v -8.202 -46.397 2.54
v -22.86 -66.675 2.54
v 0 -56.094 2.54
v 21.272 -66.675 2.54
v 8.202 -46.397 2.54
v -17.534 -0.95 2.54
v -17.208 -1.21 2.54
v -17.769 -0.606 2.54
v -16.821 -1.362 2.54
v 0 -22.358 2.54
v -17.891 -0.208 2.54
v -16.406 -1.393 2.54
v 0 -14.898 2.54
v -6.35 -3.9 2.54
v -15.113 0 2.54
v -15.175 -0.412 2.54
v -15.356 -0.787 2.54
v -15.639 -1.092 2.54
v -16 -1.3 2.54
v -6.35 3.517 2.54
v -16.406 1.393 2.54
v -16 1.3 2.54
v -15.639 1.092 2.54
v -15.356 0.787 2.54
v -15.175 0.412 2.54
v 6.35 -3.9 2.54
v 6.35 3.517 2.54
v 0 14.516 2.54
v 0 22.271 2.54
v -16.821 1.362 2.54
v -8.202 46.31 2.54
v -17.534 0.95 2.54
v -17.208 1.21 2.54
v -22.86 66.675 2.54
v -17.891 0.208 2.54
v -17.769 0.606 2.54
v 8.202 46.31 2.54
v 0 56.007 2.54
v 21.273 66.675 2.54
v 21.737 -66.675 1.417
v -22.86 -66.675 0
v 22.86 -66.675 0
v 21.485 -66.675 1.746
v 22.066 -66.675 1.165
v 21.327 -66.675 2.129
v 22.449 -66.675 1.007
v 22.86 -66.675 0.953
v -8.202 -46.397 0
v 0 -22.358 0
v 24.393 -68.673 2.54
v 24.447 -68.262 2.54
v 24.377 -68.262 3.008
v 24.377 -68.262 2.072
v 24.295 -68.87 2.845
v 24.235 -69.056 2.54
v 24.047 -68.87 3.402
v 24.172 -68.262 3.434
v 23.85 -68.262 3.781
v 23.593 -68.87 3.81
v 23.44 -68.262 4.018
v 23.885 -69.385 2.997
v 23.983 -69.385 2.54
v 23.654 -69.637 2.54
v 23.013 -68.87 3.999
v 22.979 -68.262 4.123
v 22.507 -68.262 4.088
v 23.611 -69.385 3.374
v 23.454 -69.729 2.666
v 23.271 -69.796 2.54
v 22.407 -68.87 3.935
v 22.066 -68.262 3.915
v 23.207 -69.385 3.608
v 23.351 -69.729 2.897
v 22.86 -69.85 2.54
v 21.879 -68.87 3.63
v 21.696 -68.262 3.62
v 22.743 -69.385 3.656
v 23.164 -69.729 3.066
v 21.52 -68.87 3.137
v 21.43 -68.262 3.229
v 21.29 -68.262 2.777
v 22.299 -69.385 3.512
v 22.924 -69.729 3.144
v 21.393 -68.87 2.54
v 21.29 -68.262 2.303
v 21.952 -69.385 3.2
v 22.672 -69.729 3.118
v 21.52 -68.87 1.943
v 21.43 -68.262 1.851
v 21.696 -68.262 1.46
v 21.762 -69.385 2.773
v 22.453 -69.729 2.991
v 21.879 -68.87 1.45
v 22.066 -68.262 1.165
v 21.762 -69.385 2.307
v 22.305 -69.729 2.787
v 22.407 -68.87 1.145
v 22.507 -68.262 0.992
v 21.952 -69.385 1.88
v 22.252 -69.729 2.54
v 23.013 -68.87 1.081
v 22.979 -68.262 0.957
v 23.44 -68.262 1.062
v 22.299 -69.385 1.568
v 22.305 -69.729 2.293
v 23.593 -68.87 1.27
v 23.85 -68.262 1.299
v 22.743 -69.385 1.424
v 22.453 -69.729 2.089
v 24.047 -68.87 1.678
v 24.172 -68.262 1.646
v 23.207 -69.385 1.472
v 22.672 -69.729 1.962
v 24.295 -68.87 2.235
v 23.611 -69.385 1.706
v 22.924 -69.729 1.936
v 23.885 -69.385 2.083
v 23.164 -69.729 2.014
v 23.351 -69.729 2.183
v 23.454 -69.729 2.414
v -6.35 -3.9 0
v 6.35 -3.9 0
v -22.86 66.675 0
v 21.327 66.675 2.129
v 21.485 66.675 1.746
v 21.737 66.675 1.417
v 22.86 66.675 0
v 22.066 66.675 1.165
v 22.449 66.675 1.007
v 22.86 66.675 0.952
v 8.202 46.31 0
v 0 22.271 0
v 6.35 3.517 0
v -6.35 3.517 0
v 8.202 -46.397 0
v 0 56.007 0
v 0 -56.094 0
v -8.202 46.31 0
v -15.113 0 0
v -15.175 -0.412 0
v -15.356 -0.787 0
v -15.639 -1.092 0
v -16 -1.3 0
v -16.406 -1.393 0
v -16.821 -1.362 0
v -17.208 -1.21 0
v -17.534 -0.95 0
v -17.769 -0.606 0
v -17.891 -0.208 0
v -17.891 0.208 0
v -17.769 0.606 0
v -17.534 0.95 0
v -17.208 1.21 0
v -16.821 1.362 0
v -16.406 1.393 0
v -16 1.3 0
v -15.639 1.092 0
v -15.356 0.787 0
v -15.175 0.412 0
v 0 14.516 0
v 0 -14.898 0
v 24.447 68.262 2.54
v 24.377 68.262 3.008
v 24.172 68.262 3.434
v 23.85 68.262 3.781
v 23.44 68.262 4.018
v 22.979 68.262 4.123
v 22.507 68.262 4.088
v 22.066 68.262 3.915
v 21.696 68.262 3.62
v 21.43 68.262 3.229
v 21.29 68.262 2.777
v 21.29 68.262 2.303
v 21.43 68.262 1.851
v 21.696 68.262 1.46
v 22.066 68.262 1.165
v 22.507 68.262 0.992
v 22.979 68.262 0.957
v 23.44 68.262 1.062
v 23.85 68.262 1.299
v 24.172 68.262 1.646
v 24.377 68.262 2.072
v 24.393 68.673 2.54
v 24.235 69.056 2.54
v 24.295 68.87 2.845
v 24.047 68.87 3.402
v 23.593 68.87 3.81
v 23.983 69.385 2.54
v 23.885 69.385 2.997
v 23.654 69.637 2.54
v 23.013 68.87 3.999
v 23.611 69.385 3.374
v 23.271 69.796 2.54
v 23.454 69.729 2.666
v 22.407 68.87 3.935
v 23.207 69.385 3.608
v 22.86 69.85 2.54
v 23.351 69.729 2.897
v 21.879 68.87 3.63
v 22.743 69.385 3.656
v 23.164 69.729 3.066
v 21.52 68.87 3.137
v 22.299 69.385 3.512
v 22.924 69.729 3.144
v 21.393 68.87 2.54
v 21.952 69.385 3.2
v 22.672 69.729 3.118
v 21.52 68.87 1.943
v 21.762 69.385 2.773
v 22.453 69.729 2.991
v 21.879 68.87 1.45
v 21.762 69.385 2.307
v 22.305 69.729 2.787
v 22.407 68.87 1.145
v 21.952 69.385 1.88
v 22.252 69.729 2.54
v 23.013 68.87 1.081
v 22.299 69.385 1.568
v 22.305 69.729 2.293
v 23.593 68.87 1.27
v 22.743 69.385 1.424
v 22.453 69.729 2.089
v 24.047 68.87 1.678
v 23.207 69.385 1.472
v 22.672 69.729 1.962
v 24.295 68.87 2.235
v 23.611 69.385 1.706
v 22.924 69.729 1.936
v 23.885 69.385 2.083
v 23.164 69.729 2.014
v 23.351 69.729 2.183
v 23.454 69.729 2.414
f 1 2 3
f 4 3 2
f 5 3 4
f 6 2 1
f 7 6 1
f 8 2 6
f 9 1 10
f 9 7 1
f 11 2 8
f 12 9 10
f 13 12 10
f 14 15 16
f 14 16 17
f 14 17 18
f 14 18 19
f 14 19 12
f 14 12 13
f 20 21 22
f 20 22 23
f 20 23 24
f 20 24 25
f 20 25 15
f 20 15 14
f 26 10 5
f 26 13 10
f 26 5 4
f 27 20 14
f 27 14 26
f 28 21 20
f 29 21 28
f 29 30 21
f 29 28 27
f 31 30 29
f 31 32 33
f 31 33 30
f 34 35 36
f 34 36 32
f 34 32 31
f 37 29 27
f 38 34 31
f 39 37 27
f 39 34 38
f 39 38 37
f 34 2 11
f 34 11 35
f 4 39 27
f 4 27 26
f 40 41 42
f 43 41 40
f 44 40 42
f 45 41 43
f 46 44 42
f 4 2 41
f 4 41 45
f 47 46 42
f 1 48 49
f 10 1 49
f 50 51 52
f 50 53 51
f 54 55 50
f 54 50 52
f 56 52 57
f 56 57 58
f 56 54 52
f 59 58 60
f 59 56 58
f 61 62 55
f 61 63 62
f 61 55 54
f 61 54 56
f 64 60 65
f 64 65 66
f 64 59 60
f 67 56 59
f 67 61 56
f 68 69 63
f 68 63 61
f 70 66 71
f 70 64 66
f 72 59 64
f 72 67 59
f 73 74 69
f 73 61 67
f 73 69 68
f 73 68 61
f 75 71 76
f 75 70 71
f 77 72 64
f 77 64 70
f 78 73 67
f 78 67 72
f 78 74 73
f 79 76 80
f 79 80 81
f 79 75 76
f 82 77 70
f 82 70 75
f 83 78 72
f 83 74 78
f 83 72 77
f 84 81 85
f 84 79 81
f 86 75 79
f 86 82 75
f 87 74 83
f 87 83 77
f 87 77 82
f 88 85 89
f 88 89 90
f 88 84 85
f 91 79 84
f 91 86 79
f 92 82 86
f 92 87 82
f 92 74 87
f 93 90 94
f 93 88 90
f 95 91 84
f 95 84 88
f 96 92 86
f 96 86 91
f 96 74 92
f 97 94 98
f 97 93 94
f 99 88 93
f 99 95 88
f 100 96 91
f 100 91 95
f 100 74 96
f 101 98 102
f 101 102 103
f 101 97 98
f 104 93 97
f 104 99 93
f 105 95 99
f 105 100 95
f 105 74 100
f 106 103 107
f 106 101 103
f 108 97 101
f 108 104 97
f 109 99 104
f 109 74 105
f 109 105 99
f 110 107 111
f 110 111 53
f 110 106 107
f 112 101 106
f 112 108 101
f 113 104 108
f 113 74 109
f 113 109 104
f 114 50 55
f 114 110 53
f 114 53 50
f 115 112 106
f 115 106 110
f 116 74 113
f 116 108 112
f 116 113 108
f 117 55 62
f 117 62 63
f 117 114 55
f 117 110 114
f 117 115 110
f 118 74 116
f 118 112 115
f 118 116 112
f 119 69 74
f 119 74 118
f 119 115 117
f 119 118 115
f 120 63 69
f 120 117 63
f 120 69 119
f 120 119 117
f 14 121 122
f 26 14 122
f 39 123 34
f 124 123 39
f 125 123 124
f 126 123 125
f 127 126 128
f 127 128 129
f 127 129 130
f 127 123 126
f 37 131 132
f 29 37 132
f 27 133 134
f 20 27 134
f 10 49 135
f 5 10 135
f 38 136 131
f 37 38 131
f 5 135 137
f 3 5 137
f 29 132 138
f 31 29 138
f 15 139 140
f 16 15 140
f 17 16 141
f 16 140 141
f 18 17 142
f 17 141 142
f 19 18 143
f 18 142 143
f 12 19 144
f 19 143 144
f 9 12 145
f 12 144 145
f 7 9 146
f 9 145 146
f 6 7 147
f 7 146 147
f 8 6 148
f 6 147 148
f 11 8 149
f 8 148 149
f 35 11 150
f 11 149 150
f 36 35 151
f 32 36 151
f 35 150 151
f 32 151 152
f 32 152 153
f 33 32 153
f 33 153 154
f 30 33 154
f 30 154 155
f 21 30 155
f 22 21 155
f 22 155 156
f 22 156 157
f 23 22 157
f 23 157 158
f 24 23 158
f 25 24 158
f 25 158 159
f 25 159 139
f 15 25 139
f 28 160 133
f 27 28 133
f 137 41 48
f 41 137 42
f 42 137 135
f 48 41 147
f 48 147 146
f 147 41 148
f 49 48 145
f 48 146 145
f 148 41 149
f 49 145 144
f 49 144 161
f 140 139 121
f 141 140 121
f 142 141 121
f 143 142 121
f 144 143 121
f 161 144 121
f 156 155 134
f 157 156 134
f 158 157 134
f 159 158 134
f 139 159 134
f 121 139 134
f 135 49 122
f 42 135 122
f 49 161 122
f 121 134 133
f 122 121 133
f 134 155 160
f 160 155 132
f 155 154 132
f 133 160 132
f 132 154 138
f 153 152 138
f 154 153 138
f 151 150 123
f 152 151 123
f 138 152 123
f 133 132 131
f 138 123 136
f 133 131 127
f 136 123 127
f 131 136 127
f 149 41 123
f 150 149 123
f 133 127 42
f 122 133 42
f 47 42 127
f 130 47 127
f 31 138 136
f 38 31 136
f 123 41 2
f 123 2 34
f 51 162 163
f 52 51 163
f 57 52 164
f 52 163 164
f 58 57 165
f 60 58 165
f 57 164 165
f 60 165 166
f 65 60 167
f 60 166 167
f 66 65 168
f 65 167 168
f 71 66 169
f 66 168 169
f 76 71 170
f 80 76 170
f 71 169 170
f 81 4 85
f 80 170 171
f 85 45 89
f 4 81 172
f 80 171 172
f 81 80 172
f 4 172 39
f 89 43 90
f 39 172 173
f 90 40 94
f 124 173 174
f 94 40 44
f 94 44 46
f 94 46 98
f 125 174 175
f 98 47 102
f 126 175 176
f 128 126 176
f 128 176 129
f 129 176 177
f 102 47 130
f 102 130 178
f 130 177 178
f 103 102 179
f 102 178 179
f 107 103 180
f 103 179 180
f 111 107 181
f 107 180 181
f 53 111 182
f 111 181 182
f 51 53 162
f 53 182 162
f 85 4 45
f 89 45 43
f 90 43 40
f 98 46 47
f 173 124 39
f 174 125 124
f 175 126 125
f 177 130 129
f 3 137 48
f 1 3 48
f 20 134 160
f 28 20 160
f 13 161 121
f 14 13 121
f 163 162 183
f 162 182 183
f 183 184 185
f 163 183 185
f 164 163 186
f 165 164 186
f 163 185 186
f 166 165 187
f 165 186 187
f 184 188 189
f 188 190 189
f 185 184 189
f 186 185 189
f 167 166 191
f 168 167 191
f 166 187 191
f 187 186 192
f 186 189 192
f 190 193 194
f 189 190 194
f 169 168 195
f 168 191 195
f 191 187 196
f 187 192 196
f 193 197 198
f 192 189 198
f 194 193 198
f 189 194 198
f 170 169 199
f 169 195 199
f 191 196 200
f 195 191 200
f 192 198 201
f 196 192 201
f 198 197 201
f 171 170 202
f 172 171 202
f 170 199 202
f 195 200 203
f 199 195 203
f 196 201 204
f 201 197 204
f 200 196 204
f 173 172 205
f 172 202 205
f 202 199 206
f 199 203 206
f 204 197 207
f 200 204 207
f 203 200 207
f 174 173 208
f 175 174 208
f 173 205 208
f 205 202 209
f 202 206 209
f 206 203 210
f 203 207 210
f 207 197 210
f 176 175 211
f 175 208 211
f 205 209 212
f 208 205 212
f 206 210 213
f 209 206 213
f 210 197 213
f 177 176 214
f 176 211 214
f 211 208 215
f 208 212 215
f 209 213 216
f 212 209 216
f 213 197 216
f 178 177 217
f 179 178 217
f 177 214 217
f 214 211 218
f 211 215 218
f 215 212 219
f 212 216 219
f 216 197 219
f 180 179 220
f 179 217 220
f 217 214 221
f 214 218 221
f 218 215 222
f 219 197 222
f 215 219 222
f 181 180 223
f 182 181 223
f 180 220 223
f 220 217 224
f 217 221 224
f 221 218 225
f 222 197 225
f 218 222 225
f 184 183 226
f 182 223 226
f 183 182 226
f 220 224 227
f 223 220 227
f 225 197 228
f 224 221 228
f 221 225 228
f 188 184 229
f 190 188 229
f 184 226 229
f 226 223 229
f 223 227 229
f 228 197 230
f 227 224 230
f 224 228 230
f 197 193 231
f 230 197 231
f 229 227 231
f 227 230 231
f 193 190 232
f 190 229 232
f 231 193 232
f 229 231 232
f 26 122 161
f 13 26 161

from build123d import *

# Parameters (mm, degrees)
F0_W     = 45.72
F0_H     = 133.35
F1_DEPTH = 2.54
F2_R     = 1.5875
F3_DEPTH = 136.525
F4_DEPTH = 3.175
F5_R     = 1.5875
F7_DEPTH = 25.4
F9_DEPTH = 25.4


with BuildPart() as f1:
    # F0 (on Top) → F1 (new body)
    with BuildSketch(Plane.XY):
        Rectangle(F0_W, F0_H)
    extrude(amount=F1_DEPTH)

    # F2 (on face) → F3 (join)
    with BuildSketch(Plane.XZ.offset(66.675)):
        with Locations((22.86, 2.54)):
            Circle(F2_R)
    extrude(amount=-F3_DEPTH)

    # F2 (on face) → F4 (join)
    with BuildSketch(Plane.XZ.offset(66.675)):
        with Locations((22.86, 2.54)):
            Circle(F2_R)
    extrude(amount=F4_DEPTH)

    # F5
    f5_edges = [f1.edges().sort_by_distance(p)[0] for p in [
        (21.2725, -69.85, 2.54),
        (21.2725, 69.85, 2.54),
    ]]
    fillet(f5_edges, radius=F5_R)

    # F6 (on face) → F7 (cut)
    with BuildSketch(Plane(origin=(0, 0, 0), x_dir=(1, 0, 0), z_dir=(0, 0, -1))):
        with BuildLine():
            ThreePointArc((-17.907, 0), (-16.51, -1.397), (-15.113, 0))
            ThreePointArc((-15.113, 0), (-16.51, 1.397), (-17.907, 0))
        make_face()
    extrude(amount=-F7_DEPTH, mode=Mode.SUBTRACT)

    # F8 (on face) → F9 (cut)
    with BuildSketch(Plane(origin=(0, 0, 0), x_dir=(1, 0, 0), z_dir=(0, 0, -1))):
        Polygon((8.20166, 46.397122), (0, 56.093656), (-8.20166, 46.397122), (0, 22.357721), align=None)
        Polygon((-8.20166, -46.310099), (0, -56.006633), (8.20166, -46.310099), (0, -22.270698), align=None)
        Polygon((-6.35, -3.517313), (0, -14.515836), (6.35, -3.517313), align=None)
        Polygon((6.35, 3.899692), (0, 14.898214), (-6.35, 3.899692), align=None)
    extrude(amount=-F9_DEPTH, mode=Mode.SUBTRACT)


solid = f1.part
